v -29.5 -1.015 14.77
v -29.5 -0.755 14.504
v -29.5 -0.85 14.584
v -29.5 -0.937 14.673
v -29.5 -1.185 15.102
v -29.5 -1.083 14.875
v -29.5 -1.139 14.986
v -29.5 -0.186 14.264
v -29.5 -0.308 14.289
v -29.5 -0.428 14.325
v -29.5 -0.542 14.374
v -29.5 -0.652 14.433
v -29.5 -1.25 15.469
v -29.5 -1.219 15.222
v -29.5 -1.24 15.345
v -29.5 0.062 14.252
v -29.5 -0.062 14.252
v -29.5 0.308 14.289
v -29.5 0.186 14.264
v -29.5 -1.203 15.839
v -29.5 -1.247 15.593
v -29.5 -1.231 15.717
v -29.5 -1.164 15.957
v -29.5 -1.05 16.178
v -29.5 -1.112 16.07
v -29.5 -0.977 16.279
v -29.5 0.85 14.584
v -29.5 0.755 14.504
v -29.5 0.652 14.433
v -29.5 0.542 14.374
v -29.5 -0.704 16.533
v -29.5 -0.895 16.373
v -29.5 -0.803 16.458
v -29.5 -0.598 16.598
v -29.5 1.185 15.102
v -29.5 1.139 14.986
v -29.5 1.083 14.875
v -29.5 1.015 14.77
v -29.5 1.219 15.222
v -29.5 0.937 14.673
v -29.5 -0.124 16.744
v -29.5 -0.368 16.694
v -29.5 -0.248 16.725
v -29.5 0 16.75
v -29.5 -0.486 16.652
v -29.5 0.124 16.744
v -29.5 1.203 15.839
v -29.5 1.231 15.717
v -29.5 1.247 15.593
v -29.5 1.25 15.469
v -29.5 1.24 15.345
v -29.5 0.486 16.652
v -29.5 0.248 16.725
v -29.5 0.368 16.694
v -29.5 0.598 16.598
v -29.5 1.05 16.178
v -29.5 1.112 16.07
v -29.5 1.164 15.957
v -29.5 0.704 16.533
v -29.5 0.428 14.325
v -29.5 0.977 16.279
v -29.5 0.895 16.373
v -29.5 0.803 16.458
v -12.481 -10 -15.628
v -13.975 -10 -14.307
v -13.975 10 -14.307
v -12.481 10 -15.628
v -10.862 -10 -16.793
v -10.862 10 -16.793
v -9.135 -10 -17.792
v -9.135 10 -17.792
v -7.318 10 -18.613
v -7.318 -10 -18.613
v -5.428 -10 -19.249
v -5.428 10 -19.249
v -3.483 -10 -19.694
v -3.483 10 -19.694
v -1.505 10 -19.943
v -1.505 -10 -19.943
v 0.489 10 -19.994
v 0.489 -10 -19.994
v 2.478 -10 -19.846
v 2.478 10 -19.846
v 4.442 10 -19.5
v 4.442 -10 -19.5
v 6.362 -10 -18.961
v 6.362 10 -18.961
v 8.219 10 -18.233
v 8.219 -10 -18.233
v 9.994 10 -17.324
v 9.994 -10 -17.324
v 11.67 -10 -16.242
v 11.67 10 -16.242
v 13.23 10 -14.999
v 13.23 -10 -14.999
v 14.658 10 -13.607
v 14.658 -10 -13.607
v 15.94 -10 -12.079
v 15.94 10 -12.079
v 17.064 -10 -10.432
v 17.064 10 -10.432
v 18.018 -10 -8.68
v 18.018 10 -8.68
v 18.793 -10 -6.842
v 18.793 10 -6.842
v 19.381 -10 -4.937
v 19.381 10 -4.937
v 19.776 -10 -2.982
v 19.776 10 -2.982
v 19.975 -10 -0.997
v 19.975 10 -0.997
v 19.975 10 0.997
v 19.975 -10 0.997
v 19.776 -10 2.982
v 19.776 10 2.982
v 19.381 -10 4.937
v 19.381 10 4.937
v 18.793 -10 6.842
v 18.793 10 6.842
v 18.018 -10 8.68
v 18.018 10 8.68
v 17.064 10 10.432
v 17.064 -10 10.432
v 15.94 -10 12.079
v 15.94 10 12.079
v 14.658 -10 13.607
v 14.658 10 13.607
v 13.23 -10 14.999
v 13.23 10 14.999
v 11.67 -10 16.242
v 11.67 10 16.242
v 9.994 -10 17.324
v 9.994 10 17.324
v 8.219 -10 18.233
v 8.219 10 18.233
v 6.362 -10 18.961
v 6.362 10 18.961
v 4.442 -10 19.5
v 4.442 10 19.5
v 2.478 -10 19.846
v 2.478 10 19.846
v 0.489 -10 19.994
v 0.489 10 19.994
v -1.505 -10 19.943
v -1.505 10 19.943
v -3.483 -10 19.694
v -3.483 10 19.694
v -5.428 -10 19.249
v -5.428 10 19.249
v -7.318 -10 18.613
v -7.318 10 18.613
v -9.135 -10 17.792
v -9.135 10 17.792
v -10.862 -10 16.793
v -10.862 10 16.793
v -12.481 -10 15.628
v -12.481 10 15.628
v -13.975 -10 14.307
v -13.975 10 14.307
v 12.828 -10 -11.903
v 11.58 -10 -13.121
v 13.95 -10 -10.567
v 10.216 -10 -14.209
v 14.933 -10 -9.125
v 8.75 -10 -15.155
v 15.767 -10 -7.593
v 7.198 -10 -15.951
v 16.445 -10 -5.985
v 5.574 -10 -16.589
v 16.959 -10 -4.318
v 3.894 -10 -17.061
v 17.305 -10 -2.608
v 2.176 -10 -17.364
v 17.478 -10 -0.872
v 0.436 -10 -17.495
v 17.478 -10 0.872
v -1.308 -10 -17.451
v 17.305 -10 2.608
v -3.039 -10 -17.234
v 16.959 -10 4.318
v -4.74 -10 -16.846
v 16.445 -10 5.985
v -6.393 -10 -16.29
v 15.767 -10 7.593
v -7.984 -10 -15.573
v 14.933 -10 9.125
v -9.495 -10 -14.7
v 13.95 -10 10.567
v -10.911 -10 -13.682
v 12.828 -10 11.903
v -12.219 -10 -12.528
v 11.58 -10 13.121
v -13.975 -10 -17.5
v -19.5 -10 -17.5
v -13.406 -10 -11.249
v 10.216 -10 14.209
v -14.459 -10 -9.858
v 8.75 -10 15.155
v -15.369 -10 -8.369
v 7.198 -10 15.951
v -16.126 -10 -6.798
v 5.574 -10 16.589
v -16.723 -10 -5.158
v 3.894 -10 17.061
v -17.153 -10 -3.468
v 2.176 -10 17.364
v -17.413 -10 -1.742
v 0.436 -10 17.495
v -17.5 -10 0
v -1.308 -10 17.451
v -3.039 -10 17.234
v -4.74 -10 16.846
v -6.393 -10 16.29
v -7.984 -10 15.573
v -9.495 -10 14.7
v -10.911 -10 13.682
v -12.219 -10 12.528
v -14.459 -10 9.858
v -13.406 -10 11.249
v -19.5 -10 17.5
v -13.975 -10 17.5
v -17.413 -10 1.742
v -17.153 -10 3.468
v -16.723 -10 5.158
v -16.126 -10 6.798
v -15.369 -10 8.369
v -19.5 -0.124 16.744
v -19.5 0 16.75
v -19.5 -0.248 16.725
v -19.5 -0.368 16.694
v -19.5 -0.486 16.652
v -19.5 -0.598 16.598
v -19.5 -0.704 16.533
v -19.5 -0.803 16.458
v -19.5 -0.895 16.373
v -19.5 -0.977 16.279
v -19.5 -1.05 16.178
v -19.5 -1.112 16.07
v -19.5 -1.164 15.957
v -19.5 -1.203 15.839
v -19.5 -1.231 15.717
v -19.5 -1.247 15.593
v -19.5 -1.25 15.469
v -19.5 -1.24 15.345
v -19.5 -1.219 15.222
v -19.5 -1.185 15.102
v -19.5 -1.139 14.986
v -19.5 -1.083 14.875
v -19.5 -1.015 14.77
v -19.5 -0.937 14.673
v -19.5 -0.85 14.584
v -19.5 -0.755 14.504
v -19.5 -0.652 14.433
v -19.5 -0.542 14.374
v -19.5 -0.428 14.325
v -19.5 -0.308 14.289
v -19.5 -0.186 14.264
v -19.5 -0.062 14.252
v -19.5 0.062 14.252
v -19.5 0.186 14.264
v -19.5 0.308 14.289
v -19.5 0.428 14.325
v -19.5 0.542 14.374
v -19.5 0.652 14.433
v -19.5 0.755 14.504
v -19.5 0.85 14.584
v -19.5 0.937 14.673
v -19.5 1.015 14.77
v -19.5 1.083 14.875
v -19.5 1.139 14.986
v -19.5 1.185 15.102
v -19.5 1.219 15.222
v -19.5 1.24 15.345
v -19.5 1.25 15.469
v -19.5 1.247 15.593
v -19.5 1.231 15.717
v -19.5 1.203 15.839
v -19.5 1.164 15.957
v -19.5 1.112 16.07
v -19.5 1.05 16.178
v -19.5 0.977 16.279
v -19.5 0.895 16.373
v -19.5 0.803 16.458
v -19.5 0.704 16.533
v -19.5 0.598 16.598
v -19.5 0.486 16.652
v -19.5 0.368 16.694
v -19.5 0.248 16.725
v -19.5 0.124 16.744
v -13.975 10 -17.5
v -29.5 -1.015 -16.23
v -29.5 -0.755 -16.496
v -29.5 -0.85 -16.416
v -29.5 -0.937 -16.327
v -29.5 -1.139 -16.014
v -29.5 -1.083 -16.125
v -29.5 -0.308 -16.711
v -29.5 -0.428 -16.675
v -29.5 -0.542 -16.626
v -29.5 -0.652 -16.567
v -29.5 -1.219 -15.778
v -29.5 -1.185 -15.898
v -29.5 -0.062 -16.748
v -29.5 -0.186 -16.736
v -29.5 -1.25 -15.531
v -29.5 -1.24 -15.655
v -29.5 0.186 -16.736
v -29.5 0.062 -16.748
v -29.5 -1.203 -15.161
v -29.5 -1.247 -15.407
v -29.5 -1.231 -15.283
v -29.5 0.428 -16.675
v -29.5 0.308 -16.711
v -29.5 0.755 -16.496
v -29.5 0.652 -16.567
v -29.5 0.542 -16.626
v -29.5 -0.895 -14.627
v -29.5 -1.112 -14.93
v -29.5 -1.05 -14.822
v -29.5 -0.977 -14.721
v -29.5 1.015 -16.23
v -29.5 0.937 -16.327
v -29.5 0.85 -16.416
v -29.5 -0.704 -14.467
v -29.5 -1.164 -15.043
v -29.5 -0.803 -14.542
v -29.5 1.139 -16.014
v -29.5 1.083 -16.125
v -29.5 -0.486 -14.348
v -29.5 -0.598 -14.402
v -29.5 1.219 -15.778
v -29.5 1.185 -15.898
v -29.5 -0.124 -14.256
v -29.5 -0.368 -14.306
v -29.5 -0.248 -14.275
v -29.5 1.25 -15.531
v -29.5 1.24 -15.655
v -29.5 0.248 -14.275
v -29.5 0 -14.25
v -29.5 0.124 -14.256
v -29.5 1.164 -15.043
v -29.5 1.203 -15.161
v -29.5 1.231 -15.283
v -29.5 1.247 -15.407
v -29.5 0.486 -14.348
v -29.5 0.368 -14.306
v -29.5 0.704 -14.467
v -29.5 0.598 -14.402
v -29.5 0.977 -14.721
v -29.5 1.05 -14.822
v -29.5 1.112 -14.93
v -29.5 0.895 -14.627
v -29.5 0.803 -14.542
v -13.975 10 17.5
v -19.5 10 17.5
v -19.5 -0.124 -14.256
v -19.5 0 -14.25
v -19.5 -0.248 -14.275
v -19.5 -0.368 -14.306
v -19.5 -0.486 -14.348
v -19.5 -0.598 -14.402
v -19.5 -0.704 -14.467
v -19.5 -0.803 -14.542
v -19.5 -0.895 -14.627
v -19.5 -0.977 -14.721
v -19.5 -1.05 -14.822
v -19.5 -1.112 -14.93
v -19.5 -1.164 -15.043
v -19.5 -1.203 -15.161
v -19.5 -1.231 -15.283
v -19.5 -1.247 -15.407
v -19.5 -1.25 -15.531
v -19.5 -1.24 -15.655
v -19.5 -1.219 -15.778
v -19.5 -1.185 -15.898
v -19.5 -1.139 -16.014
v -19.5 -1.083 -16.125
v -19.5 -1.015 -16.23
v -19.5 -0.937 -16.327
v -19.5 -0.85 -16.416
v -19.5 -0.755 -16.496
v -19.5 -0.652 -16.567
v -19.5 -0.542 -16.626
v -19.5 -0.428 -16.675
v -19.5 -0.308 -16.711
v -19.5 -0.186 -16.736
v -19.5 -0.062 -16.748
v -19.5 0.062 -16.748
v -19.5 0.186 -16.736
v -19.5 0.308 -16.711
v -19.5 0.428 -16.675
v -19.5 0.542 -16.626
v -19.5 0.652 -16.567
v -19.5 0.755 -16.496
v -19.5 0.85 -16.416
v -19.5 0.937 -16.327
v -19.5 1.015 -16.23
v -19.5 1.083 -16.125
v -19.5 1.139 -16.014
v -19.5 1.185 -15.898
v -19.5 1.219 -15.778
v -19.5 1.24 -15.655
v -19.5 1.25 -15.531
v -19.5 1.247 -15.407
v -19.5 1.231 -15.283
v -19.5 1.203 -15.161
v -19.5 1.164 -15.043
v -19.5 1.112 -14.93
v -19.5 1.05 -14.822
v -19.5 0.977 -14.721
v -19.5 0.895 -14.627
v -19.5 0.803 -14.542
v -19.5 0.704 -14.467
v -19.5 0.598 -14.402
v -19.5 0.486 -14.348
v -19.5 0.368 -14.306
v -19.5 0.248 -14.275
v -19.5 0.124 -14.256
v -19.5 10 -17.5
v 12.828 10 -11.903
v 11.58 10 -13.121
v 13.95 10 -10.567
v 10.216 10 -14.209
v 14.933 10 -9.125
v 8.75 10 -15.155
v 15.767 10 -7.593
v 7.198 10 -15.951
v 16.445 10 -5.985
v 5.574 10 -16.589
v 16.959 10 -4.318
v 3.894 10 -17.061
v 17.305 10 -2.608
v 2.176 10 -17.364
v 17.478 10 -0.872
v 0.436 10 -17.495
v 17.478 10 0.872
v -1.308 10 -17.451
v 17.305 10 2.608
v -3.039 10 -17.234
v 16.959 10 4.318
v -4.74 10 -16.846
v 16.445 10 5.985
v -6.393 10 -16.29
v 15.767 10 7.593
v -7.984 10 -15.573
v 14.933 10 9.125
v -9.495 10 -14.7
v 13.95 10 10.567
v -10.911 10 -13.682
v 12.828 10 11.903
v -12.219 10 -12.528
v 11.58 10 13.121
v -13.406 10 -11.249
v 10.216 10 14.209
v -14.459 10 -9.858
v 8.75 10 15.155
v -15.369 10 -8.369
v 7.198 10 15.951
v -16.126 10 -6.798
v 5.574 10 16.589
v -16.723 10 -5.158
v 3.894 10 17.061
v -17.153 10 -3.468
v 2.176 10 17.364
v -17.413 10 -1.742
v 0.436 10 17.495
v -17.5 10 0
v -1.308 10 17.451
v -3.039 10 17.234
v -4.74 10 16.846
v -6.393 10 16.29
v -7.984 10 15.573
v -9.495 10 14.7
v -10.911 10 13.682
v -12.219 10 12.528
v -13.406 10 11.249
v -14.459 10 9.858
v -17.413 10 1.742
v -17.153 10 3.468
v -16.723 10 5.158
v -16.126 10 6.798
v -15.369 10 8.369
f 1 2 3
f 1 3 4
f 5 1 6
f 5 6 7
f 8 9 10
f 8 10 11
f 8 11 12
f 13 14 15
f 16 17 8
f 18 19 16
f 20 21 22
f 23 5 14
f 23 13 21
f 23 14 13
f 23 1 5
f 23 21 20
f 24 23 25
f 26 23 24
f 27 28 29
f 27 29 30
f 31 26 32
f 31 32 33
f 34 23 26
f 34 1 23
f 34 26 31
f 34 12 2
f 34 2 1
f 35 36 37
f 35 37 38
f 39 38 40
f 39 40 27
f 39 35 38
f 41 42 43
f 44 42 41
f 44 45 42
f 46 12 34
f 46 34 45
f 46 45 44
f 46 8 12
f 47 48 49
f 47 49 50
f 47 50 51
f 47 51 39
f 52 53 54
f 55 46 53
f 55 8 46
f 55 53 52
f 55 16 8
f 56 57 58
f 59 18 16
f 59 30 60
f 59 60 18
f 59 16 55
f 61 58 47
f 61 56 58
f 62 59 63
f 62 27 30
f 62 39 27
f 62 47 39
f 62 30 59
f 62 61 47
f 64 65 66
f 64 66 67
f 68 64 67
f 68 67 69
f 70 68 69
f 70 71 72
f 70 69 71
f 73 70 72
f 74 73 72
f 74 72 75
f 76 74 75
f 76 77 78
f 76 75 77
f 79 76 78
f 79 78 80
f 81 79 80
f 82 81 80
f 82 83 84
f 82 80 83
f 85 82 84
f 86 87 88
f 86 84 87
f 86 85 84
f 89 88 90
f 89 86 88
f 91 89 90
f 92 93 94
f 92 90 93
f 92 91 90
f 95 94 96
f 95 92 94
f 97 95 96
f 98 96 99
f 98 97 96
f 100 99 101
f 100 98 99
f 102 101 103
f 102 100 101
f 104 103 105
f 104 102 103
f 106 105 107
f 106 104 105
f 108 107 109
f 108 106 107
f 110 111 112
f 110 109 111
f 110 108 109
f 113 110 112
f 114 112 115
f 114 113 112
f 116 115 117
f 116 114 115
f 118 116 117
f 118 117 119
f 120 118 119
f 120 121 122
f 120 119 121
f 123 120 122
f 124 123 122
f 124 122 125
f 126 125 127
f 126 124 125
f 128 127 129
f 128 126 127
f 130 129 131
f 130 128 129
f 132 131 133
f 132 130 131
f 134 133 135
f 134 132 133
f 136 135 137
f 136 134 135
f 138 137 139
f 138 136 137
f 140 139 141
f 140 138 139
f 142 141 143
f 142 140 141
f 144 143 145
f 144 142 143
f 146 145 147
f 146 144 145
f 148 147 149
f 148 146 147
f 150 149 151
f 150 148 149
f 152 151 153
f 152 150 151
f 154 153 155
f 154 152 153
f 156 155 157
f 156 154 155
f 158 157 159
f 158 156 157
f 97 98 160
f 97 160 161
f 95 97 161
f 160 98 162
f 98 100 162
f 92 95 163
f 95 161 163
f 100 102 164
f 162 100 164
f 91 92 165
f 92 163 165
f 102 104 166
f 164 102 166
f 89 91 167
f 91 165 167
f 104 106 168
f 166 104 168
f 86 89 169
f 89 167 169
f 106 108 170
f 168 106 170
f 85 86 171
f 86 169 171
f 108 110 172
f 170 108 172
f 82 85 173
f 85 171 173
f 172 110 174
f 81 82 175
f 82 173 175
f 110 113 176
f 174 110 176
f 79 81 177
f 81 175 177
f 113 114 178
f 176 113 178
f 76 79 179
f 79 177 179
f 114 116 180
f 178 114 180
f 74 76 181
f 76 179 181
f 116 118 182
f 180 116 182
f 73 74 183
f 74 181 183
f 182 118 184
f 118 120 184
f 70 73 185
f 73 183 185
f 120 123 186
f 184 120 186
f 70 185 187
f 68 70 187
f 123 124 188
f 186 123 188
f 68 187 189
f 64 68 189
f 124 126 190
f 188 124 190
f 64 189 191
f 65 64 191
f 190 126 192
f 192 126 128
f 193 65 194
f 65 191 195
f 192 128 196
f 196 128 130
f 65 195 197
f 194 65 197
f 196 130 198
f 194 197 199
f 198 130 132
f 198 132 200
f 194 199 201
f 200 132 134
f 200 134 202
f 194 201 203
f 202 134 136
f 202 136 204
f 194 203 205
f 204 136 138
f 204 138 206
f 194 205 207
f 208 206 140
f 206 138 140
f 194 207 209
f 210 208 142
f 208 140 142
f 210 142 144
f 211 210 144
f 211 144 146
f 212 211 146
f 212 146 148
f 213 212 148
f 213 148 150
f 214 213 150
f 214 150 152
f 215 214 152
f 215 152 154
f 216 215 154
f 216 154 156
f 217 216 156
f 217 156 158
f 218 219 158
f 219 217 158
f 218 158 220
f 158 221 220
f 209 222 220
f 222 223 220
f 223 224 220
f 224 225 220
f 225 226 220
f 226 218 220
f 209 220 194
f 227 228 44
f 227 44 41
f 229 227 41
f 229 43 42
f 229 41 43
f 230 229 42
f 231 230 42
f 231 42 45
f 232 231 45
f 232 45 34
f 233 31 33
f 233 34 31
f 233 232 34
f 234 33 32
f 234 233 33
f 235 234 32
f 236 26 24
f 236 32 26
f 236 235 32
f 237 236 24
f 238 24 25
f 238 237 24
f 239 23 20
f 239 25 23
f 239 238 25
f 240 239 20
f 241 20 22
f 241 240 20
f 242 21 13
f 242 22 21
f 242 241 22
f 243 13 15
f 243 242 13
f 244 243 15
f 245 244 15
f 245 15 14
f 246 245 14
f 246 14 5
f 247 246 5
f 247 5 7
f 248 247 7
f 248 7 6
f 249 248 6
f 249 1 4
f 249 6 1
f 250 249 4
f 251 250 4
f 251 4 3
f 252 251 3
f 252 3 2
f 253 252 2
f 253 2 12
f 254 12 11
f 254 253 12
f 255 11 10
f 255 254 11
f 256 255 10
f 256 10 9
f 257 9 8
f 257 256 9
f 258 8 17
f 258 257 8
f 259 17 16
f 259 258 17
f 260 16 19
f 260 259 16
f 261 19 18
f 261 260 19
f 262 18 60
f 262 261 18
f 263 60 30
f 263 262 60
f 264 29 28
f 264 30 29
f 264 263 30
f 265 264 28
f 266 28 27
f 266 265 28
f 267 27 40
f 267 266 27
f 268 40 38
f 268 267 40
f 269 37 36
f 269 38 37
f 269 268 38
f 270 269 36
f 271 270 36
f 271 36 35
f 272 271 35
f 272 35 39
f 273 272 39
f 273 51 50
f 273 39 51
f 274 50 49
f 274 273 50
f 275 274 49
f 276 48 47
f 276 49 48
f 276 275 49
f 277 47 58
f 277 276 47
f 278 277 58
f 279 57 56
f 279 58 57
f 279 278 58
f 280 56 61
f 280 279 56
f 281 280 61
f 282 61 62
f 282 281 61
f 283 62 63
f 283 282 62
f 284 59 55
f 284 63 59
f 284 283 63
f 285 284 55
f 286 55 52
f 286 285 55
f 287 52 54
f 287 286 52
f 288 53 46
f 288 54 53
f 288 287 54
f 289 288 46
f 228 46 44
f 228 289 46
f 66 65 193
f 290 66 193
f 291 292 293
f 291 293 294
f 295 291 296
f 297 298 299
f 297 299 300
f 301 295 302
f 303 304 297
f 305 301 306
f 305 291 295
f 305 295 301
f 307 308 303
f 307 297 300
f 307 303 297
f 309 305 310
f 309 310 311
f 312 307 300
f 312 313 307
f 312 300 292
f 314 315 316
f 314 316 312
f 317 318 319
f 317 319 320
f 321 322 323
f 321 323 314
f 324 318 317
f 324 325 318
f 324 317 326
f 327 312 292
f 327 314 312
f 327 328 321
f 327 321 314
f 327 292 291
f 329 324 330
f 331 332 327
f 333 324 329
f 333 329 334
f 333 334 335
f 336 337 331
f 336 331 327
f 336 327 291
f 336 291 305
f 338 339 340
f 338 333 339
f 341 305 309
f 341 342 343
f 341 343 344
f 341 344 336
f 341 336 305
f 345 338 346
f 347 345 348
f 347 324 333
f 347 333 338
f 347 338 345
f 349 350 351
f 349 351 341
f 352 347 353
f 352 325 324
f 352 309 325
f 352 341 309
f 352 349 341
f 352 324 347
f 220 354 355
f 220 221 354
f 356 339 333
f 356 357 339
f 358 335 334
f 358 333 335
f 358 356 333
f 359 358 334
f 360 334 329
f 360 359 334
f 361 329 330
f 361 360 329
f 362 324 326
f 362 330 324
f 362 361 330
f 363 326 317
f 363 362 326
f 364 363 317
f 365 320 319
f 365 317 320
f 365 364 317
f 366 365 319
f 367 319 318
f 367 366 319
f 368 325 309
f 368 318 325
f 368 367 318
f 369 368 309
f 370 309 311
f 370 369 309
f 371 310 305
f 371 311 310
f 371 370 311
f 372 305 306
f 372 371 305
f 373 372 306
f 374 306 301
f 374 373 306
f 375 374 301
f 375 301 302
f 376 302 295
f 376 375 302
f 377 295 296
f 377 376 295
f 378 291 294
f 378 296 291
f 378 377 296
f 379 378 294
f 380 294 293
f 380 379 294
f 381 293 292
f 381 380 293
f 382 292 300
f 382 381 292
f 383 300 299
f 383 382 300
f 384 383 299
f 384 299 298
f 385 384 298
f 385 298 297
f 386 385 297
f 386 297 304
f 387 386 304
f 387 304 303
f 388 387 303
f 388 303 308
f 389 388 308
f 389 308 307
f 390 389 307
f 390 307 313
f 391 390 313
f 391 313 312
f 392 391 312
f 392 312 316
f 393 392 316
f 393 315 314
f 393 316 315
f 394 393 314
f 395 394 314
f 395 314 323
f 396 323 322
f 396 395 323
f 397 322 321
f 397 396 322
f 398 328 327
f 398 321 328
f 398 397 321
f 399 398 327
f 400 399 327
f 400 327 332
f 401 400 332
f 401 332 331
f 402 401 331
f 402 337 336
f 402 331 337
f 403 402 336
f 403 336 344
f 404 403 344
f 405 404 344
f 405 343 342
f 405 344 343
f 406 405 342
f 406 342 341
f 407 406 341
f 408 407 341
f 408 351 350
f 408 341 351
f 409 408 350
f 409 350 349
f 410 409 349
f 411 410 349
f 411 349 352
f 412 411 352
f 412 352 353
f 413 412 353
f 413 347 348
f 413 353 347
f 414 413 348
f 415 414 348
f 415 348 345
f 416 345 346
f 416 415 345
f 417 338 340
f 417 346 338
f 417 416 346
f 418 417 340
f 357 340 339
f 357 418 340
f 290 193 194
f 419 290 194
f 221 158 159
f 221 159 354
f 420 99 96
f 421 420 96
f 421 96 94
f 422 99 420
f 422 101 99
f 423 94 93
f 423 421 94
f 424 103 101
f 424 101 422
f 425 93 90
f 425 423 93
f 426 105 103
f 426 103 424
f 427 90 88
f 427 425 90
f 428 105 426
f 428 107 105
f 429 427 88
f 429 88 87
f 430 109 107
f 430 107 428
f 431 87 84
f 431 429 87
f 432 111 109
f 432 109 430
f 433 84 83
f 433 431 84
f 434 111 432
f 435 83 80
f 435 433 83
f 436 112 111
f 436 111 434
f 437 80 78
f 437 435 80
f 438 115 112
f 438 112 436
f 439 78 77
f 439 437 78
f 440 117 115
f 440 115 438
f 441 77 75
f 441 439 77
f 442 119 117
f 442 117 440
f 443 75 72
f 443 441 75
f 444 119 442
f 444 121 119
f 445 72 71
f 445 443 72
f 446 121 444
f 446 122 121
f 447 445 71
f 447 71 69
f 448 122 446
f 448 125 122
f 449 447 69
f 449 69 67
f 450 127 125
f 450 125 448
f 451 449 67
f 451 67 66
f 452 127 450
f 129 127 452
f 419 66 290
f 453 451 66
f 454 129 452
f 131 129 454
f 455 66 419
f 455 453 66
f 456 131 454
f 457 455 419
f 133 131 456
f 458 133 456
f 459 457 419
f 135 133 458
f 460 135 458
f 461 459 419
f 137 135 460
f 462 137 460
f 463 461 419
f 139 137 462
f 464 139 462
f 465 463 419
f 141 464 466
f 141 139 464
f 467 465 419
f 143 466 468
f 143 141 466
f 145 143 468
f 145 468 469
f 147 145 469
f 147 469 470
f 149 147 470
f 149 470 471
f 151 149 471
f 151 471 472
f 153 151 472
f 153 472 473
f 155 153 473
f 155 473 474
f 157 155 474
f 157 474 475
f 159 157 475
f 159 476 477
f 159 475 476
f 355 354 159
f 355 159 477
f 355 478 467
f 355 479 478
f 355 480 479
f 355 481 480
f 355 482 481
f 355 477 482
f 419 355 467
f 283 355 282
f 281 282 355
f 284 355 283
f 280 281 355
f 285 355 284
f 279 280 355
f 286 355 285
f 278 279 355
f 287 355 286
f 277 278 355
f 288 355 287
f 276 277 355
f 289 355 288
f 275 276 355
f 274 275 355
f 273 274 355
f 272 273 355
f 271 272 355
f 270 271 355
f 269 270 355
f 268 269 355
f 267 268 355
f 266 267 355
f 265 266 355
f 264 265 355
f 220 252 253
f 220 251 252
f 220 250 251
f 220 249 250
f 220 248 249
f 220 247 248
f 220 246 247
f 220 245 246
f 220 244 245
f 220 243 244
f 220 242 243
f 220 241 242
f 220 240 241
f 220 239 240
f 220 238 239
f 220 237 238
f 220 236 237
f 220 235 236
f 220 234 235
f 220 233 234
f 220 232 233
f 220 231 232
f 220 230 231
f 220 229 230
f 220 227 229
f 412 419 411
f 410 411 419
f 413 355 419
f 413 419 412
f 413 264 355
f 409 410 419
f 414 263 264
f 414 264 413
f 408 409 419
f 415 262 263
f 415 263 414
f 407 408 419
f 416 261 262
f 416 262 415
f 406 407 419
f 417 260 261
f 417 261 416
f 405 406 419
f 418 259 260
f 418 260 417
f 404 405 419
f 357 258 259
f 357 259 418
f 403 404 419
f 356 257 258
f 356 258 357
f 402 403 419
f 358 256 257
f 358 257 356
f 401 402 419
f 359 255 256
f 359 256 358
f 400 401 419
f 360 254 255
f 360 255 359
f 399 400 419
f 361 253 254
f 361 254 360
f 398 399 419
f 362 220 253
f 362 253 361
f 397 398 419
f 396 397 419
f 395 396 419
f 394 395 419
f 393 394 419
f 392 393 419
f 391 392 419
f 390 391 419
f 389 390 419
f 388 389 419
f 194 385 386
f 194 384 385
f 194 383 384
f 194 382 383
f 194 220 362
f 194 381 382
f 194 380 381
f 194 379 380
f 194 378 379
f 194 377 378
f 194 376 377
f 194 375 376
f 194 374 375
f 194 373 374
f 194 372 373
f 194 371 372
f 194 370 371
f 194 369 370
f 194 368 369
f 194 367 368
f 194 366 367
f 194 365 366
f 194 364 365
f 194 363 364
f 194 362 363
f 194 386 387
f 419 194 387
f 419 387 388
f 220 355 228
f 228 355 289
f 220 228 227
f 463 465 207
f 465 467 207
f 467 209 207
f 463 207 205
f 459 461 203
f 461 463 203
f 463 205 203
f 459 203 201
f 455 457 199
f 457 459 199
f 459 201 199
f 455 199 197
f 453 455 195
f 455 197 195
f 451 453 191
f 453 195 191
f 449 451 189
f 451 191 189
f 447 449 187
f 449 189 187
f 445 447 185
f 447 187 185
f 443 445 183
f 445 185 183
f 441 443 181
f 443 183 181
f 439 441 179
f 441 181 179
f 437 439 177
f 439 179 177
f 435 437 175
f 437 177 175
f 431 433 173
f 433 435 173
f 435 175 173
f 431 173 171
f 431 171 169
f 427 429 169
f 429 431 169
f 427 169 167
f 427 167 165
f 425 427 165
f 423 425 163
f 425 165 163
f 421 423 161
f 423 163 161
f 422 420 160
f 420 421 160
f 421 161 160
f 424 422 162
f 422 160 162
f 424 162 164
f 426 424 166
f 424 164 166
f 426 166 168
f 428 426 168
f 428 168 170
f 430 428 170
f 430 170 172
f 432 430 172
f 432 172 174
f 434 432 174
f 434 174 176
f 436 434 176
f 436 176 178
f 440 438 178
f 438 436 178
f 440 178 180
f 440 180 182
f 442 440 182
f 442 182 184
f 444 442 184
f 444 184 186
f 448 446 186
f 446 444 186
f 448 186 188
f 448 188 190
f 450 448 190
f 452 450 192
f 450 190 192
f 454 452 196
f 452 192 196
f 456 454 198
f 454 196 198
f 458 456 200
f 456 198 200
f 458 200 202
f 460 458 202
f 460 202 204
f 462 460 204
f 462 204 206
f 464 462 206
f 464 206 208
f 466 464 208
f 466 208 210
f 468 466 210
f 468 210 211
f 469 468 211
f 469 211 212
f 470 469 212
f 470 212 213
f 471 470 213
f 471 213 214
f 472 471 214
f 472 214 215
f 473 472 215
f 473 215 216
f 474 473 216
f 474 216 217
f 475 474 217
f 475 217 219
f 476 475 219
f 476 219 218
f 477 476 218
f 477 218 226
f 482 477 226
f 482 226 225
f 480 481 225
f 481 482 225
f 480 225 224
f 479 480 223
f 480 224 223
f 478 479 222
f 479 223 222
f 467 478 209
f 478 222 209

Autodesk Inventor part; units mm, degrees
ref_plane "YZ Plane" through (0, 0, 0) normal (1, 0, 0) x (0, 1, 0)
ref_plane "XZ Plane" through (0, 0, 0) normal (0, 1, 0) x (-1, 0, 0)
ref_plane "XY Plane" through (0, 0, 0) normal (0, 0, 1) x (1, 0, 0)
sketch "Sketch1" plane through (0, 0, 0) normal (0, 1, 0) x (-1, 0, 0)
  circle A0 centre (0, 0) radius 17.5
  arc A1 (13.975, 14.3073) -> (13.975, -14.3073) centre (0, 0) ccw
  line L0 (13.975, 14.3073) -> (13.975, 17.5)
  line L1 (13.975, 17.5) -> (19.5, 17.5)
  line L2 (19.5, 17.5) -> (19.5, 0)
  line L3 (0, 0) -> (32.178, 0) construction
  line L4 (13.975, -14.3073) -> (13.975, -17.5)
  line L5 (13.975, -17.5) -> (19.5, -17.5)
  line L6 (19.5, -17.5) -> (19.5, 0)
  dimension "d0" = 35
  dimension "d2" = 19.5
  dimension "d3" = 17.5
  dimension "d4" = 5.525
  dimension "d5" = 13.975
  dimension "d6" = 40
extrude "Extrusion1" add sketch "Sketch1" along normal mid plane 20
sketch "Sketch2" plane through (-19.5, -10, 17.5) normal (-1, 0, 0) x (0, 0, 1)
  circle A0 centre (-33, 10) radius 1.25
  circle A1 centre (-2, 10) radius 1.25
  line L0 (0, 0) -> (-35, 0) projected
  point P0 (-17.5, 10)
  dimension "d14" = 31
  dimension "d15" = 15.5
  dimension "d16" = 2.5
  dimension "d17" = 2.5
  dimension "d18" = 10
  dimension "d19" = 10
extrude "Extrusion2" add sketch "Sketch2" along normal blind 10
properties part number "motor-hold"
